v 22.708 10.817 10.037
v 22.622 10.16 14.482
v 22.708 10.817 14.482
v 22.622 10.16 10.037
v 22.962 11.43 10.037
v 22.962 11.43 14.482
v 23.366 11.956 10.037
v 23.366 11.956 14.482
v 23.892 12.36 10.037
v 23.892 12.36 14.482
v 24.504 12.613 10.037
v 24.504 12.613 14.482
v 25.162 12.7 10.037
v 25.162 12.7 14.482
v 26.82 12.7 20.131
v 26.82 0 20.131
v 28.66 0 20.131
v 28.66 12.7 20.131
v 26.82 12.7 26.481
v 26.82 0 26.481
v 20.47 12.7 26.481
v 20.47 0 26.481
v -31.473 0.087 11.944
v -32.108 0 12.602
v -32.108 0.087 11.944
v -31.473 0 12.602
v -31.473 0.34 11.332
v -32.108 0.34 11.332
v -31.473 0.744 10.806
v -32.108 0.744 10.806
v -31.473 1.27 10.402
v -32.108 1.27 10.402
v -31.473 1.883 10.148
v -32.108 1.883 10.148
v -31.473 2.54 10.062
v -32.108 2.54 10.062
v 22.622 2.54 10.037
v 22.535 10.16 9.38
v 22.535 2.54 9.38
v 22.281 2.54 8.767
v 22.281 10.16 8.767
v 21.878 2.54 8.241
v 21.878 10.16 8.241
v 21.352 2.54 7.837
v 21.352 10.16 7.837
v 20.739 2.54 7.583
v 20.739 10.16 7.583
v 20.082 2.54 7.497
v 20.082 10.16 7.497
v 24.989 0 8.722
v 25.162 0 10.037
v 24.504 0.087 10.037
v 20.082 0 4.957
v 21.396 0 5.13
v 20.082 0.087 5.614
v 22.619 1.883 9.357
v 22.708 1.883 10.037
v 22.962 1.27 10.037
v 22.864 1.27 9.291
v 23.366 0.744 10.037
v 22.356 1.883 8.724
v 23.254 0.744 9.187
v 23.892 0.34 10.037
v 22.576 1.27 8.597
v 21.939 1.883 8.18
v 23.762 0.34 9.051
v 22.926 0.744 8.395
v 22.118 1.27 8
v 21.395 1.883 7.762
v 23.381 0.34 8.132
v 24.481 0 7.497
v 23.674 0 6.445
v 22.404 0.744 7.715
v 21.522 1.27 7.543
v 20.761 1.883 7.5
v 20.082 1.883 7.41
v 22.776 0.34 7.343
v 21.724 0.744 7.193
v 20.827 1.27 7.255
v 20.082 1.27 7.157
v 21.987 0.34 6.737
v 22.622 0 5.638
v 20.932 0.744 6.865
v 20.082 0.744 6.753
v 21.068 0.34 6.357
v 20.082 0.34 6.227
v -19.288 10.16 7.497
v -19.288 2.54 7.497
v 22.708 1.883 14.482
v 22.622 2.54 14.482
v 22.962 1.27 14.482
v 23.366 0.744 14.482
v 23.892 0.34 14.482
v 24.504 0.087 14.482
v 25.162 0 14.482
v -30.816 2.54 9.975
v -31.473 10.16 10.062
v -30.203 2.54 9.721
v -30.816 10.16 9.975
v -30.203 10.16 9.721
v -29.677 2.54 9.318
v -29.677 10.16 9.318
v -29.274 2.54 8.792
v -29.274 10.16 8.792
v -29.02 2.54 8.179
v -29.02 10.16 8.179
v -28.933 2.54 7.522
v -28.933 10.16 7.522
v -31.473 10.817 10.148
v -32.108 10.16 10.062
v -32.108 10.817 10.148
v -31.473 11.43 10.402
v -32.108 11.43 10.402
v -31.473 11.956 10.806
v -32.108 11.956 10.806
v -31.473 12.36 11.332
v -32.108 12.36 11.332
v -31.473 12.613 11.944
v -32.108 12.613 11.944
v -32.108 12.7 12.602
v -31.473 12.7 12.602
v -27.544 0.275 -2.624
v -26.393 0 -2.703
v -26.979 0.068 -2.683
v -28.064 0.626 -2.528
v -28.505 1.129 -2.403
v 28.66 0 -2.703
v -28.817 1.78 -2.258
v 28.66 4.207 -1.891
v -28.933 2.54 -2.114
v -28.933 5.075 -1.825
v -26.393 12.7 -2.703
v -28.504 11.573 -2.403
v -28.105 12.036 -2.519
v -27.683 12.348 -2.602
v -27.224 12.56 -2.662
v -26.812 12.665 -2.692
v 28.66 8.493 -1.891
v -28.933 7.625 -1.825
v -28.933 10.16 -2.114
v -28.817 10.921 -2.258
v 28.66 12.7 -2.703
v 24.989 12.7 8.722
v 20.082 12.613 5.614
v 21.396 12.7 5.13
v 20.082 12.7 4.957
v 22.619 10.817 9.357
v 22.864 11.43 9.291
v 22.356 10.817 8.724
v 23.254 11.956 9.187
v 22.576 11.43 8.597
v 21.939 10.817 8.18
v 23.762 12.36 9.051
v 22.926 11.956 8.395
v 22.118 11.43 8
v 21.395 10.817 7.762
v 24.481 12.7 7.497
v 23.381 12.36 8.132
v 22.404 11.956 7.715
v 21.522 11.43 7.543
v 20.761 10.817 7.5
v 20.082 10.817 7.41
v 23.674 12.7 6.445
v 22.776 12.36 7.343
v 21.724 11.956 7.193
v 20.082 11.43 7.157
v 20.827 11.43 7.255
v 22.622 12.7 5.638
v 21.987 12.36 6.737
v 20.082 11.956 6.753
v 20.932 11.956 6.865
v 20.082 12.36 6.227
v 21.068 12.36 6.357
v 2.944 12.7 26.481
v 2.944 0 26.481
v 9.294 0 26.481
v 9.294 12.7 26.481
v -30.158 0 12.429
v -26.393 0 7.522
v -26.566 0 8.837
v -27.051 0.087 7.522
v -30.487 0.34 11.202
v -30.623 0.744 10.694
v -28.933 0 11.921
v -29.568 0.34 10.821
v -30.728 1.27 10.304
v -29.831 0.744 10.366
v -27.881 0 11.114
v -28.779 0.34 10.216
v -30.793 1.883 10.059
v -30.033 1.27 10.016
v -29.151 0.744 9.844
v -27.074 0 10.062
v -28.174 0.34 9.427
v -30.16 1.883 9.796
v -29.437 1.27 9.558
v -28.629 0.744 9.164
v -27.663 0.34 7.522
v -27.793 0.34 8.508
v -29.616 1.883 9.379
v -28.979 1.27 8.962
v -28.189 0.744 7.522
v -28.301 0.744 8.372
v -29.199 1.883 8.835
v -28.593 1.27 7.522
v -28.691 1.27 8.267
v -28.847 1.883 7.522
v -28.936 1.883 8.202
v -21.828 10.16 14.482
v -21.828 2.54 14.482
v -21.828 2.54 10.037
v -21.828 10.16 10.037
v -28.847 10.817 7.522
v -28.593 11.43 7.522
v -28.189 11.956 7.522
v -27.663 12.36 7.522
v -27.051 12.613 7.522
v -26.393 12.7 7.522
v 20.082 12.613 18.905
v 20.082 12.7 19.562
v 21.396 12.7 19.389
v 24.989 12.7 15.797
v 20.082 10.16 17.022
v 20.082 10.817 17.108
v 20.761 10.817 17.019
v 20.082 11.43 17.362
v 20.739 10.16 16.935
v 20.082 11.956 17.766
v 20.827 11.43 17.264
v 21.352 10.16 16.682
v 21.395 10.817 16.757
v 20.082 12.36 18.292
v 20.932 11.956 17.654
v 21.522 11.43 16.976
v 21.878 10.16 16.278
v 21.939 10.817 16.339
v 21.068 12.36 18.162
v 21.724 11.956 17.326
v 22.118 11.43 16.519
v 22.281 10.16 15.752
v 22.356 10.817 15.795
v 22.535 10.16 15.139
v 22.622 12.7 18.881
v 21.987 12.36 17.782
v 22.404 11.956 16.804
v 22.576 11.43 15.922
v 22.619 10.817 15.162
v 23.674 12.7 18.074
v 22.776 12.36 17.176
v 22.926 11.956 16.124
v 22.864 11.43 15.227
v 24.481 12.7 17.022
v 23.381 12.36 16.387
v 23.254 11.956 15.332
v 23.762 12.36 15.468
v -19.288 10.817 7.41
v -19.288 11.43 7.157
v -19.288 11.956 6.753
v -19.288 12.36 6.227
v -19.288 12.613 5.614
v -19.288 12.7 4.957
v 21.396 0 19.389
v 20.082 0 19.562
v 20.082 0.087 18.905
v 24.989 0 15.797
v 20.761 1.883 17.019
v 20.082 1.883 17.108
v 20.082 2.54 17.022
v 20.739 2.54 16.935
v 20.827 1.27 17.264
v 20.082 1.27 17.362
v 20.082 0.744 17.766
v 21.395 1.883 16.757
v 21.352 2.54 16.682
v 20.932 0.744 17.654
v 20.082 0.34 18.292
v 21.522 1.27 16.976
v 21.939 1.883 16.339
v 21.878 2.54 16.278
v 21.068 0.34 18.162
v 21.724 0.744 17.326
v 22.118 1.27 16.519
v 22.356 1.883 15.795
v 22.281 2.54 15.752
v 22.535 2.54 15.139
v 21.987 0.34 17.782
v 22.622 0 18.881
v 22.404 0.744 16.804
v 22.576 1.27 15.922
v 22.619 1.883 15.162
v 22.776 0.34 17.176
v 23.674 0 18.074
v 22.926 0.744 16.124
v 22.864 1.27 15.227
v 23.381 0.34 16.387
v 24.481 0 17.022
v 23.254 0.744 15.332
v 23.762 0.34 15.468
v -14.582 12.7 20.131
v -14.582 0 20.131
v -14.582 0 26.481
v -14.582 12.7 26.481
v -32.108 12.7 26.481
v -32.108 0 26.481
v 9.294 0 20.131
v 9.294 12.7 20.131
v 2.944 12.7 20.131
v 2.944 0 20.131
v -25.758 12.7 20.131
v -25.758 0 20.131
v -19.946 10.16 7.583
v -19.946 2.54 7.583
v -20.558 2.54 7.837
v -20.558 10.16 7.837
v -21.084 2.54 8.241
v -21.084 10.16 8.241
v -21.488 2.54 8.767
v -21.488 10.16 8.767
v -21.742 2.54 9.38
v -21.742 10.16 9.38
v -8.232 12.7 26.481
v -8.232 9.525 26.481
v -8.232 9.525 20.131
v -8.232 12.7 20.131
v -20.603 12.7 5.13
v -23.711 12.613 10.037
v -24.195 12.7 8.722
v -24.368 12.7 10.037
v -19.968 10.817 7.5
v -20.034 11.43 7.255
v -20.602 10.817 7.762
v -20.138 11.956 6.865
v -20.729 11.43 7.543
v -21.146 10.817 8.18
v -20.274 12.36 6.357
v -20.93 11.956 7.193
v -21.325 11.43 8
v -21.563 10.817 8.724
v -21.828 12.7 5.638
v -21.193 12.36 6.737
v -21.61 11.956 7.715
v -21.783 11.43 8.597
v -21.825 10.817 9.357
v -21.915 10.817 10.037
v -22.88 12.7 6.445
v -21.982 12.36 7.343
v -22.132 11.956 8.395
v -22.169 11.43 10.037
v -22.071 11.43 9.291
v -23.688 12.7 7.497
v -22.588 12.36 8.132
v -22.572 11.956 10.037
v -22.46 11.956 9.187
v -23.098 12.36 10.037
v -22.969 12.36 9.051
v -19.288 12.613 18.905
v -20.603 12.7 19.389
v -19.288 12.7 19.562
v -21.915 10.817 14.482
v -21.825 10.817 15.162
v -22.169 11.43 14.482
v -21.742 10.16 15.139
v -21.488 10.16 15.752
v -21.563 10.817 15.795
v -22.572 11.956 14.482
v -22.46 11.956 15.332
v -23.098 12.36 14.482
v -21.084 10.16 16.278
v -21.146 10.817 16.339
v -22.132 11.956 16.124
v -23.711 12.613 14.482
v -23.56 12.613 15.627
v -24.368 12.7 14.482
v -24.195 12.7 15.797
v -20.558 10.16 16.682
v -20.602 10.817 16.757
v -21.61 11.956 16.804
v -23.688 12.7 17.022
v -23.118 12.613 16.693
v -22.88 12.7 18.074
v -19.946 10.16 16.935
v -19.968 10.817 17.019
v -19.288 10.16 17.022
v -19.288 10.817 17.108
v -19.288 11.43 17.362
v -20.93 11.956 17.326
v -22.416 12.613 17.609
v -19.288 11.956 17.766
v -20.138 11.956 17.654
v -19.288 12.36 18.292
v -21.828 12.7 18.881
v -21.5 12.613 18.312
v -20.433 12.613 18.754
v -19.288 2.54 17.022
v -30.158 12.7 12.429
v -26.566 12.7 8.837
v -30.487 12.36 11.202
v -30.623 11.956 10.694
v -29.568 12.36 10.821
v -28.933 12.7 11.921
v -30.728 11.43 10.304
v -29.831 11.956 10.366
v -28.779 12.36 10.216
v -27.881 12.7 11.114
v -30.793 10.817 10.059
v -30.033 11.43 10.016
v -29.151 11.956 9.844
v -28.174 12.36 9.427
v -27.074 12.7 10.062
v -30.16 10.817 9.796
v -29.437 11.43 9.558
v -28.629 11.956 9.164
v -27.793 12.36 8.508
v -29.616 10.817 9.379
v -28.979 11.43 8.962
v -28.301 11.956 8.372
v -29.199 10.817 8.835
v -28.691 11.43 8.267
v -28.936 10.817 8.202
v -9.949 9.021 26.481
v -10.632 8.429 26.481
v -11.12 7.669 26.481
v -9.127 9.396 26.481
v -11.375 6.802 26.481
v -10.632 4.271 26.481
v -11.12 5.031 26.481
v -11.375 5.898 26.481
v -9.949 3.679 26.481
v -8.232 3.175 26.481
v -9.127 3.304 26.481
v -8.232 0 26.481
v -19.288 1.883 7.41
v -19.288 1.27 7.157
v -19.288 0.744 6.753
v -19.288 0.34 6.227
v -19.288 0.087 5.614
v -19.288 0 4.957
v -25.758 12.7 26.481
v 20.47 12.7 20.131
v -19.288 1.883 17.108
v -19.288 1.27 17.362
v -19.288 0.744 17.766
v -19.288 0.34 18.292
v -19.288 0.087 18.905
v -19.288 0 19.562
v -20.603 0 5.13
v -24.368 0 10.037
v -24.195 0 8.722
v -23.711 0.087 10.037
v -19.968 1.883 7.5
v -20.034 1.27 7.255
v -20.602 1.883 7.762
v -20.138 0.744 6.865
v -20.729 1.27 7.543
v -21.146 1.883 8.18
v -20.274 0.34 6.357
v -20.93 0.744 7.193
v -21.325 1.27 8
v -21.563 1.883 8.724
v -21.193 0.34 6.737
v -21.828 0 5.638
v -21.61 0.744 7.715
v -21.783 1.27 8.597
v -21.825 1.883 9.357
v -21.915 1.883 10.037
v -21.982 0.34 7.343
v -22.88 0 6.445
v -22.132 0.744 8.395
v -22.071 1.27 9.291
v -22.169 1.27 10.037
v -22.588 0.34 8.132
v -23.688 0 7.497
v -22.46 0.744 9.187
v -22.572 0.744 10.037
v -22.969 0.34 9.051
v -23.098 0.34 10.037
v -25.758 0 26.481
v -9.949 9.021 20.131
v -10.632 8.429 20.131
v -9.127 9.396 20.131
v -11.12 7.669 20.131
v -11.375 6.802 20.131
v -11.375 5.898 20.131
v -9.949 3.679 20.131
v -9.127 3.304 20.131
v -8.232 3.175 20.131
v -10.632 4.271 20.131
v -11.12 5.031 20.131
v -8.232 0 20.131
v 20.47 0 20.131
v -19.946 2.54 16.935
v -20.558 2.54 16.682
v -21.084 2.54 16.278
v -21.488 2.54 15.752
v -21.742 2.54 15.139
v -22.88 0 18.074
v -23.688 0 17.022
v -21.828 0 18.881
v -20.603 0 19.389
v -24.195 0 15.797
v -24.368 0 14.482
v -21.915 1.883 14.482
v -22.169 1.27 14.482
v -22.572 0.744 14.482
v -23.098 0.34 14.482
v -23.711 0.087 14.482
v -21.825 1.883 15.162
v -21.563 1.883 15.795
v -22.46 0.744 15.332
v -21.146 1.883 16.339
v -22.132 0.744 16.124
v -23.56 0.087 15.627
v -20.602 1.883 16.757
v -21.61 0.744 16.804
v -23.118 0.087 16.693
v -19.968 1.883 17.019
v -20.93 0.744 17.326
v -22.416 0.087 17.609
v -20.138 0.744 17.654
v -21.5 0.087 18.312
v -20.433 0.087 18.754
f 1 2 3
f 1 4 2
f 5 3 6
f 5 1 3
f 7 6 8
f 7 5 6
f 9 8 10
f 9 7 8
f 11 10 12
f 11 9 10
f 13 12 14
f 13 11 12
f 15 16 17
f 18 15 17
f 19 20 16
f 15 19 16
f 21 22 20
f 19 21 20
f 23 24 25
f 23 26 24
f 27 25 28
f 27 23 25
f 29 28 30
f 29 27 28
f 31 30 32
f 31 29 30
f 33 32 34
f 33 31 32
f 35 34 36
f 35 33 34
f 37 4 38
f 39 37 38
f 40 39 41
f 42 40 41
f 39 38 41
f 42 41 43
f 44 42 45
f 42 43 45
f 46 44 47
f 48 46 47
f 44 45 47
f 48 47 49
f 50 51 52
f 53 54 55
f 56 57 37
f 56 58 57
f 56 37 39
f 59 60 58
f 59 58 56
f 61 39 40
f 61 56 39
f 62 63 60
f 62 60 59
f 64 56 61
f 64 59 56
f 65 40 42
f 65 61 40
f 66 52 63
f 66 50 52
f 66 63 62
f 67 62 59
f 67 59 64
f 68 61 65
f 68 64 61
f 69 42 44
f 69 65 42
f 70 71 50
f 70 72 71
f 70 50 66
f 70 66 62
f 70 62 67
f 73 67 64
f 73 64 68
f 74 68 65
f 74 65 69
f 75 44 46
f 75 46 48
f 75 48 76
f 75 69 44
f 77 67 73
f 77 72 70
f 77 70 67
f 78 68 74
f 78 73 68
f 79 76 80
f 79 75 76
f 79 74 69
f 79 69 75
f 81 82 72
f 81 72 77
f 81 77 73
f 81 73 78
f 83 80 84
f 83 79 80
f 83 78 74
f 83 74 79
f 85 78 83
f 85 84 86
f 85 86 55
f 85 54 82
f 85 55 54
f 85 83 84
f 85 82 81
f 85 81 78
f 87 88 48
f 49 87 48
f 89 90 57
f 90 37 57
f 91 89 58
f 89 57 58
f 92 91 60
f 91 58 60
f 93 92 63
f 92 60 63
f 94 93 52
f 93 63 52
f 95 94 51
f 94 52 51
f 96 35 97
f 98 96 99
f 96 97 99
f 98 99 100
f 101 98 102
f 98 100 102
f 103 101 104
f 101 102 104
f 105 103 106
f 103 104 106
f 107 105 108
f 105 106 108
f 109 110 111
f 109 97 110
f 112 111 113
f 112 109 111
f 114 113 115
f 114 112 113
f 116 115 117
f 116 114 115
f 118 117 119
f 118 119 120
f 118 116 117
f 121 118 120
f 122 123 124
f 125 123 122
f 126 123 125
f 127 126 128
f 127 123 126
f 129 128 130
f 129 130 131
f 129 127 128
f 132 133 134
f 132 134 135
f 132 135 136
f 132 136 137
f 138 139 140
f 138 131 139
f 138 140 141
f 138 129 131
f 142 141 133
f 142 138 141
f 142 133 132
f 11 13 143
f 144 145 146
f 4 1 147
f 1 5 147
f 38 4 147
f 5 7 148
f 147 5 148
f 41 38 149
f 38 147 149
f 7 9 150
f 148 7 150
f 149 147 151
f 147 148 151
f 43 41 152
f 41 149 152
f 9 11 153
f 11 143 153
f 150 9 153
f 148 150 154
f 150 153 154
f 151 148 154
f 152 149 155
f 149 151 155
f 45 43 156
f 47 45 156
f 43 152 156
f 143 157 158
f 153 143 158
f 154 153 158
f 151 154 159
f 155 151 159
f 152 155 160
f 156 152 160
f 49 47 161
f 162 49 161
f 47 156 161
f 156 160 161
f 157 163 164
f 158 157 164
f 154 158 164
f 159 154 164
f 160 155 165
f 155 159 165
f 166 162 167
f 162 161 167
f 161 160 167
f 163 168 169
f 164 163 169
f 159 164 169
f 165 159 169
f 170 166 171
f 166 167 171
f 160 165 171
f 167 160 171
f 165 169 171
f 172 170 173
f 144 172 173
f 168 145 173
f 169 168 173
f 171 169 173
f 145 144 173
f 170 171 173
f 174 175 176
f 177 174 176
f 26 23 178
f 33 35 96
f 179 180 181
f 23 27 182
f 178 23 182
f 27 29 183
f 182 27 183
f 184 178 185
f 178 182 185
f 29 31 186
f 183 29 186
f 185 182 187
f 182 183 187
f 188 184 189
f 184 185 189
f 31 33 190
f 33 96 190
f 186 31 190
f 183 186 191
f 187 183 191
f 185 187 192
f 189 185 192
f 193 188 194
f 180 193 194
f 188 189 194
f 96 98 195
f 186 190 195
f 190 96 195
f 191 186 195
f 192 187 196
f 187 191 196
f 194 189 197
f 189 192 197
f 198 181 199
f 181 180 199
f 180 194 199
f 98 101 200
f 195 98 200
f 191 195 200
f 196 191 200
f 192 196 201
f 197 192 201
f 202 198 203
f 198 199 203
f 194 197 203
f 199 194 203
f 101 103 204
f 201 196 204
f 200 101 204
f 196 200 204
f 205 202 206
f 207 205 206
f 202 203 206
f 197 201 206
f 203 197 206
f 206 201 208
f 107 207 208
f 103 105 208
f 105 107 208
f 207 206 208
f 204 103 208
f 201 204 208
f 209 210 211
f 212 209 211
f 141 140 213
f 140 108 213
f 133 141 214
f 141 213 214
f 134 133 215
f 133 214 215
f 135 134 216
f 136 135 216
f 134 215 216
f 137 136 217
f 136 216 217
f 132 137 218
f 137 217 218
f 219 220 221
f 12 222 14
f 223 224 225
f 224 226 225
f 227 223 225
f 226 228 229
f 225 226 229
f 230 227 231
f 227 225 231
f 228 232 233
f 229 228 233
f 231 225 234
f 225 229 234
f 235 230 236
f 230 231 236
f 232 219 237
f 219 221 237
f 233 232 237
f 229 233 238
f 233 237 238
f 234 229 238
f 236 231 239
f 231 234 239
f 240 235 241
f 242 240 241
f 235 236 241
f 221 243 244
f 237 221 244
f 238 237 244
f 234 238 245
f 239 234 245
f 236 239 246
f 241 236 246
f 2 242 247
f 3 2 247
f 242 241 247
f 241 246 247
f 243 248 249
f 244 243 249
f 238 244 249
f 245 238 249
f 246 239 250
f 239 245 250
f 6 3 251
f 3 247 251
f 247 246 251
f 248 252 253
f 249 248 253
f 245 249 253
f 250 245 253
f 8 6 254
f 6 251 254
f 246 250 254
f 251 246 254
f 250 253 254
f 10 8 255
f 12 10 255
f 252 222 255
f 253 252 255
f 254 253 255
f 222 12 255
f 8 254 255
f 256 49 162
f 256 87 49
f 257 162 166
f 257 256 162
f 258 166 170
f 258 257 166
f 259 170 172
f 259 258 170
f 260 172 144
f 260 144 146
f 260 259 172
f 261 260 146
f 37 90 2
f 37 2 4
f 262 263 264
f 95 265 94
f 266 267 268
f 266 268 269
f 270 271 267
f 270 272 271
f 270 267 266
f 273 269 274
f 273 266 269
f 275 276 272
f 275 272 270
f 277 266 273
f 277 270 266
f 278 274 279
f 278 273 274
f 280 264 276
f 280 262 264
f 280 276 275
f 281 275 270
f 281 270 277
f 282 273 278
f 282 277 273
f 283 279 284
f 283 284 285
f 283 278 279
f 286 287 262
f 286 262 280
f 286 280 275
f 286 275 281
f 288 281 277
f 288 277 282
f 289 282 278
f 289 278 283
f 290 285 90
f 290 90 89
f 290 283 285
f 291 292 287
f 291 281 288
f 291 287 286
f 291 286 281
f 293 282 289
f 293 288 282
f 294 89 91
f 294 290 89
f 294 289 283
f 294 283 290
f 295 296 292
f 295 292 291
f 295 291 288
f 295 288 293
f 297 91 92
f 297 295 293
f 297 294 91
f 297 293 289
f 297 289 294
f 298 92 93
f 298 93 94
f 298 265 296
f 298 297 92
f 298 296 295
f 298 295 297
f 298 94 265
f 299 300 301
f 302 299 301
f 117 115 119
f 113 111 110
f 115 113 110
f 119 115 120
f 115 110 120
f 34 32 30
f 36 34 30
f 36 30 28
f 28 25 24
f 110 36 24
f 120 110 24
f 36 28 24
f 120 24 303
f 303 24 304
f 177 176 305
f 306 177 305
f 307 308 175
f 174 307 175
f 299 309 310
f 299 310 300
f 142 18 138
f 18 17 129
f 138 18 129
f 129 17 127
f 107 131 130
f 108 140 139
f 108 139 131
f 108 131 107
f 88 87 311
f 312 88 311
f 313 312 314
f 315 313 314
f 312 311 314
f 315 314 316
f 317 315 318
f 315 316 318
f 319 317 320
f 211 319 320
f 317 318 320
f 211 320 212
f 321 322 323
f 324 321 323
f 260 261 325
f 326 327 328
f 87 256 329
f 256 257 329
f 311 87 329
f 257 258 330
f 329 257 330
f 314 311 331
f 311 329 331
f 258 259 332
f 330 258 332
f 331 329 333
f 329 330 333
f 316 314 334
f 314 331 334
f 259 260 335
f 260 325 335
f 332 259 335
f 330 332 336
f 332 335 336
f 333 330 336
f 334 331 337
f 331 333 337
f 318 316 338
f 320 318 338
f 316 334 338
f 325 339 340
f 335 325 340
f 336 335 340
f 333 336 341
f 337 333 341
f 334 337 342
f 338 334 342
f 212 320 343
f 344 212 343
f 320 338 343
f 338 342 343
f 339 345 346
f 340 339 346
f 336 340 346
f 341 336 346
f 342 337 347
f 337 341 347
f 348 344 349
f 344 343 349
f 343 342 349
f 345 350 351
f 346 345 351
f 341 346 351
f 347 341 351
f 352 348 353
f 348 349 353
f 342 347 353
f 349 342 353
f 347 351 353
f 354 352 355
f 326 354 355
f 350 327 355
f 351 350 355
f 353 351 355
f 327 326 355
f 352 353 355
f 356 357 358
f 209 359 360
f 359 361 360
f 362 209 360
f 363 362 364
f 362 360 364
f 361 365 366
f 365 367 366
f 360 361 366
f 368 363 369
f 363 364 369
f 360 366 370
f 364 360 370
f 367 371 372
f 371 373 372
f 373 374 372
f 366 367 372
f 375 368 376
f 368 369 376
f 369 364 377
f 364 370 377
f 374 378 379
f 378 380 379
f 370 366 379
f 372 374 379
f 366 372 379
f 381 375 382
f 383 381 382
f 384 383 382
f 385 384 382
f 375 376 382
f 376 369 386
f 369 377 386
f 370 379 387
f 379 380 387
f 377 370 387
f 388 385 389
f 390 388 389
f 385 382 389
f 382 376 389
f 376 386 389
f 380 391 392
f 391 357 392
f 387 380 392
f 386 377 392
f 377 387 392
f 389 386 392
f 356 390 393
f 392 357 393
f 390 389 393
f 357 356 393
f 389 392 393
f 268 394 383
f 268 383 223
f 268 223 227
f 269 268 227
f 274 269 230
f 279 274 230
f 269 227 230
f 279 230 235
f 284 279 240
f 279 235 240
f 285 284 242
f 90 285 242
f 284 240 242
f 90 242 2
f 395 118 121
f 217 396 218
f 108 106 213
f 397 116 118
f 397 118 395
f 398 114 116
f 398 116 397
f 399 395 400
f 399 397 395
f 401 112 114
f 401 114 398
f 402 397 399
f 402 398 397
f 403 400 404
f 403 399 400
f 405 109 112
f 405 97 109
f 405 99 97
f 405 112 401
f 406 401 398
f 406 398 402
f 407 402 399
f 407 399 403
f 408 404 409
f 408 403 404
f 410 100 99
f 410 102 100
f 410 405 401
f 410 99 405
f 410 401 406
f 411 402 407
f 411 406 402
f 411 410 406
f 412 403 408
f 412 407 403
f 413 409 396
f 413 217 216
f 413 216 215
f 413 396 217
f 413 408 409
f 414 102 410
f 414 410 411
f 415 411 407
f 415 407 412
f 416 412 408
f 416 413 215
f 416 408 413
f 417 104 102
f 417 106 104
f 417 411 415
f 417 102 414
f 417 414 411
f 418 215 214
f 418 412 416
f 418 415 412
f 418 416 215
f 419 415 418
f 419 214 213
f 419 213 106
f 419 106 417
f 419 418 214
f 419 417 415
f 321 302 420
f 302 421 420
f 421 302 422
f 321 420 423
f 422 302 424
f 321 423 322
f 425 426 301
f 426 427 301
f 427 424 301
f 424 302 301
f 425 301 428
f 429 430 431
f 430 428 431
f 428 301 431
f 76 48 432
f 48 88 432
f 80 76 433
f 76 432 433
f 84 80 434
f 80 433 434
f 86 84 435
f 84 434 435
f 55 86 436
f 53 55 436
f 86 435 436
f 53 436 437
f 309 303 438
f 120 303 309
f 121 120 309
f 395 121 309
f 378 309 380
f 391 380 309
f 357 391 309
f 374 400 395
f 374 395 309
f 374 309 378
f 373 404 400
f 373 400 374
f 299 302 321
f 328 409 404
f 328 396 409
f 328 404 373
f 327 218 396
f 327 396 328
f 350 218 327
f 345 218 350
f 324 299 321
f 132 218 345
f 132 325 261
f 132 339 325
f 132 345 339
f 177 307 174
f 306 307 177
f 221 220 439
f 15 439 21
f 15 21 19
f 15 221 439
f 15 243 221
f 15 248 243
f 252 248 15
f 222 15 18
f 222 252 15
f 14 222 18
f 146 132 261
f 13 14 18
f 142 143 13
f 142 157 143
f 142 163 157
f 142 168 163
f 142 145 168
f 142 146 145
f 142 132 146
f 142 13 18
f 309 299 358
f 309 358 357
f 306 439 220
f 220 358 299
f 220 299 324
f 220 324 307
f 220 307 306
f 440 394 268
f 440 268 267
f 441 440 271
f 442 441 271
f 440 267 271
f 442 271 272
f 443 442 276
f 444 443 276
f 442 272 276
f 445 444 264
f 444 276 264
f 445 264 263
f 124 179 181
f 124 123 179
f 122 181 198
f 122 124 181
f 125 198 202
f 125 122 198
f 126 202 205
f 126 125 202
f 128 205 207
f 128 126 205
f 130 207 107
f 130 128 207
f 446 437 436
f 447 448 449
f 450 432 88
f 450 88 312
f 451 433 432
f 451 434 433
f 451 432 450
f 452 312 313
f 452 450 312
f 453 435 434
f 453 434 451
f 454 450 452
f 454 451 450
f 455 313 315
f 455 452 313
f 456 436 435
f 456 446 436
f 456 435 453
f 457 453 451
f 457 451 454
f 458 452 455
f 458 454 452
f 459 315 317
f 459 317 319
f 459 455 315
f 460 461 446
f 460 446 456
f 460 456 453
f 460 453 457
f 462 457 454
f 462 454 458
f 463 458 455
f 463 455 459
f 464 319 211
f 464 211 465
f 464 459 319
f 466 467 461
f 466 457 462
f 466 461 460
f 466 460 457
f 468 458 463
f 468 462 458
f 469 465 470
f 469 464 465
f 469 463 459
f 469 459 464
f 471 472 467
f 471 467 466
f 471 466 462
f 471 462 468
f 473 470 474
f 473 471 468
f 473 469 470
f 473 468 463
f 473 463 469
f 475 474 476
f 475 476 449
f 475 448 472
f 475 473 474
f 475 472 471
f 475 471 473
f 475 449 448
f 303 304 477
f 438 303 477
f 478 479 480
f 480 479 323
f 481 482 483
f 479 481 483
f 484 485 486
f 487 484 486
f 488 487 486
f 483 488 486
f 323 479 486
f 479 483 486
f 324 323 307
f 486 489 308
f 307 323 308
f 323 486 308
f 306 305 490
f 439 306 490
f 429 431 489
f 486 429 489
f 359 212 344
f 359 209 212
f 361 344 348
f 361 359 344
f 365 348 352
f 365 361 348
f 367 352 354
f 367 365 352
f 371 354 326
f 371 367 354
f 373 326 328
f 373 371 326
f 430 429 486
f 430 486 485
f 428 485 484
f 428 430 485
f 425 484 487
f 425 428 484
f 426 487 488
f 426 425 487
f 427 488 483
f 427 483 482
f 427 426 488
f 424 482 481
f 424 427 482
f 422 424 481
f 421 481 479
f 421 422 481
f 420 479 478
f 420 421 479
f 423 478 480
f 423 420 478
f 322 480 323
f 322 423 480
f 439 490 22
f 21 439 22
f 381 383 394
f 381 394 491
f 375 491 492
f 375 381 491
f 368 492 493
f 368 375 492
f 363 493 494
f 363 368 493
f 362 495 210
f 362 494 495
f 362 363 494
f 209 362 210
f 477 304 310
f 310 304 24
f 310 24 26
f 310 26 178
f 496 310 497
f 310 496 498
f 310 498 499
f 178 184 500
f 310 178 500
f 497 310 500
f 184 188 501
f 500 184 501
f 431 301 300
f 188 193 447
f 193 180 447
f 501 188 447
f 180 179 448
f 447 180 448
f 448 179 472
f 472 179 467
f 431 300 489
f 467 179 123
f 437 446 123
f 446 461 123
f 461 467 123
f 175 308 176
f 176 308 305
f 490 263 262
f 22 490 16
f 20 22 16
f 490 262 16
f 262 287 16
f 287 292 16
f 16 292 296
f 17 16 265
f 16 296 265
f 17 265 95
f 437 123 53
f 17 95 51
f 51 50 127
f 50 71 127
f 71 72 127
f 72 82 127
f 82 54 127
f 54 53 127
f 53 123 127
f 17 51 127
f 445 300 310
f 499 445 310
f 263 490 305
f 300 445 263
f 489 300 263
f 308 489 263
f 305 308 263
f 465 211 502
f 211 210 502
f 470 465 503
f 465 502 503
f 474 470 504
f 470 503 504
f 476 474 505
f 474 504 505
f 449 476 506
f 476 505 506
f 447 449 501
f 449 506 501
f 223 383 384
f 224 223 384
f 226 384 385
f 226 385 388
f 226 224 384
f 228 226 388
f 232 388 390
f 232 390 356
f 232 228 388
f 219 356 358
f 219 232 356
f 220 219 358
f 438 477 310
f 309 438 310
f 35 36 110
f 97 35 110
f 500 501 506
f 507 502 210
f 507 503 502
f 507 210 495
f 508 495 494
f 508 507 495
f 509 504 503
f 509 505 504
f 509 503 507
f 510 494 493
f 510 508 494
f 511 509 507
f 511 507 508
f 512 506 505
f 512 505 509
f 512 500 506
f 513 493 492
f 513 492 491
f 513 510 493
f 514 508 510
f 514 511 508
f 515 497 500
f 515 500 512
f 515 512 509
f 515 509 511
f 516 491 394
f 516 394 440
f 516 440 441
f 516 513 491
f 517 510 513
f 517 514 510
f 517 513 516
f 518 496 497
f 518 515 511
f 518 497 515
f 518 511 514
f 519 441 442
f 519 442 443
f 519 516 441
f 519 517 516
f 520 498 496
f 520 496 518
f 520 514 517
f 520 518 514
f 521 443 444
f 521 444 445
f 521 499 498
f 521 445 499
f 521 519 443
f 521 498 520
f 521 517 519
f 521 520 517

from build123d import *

# Parameters (mm, degrees)
SKETCH1_W           = 44.45
SKETCH1_H           = 9.525
BOSS_EXTRUDE1_DEPTH = 12.7
FILLET1_R           = 2.54
FILLET2_R           = 2.54
CUT_EXTRUDE2_DEPTH  = 6.35
CUT_EXTRUDE6_DEPTH  = 68.493049433
CUT_EXTRUDE7_DEPTH  = 3.175
SKETCH5_W           = 9.525
SKETCH5_H           = 12.7
CUT_EXTRUDE8_DEPTH  = 3.175
FILLET3_R           = 2.54


with BuildPart() as part:
    # Sketch1 → Boss-Extrude1 (new body)
    with BuildSketch(Plane(origin=(0, 0, 0), x_dir=(1, 0, 0), z_dir=(0, 1, 0))):
        Polygon((26.819703528, -20.131014632), (28.659931952, -20.131014632), (28.659931952, 17.968985368), (-28.898317878, 17.968985368), (-28.898317878, 12.851244956), (-32.108296472, 12.851244956), (-32.108296472, -20.131014632), (-32.108296472, -26.481014632), (-25.758296472, -26.481014632), (-25.758296472, -20.131014632), (-14.582296472, -20.131014632), (-14.582296472, -26.481014632), (-8.232296472, -26.481014632), (-8.232296472, -20.131014632), (2.943703528, -20.131014632), (2.943703528, -26.481014632), (9.293703528, -26.481014632), (9.293703528, -20.131014632), (20.469703528, -20.131014632), (20.469703528, -26.481014632), (26.819703528, -26.481014632), align=None)
        with Locations((0.396638353, -12.259443339)):
            Rectangle(SKETCH1_W, SKETCH1_H, mode=Mode.SUBTRACT)
    extrude(amount=BOSS_EXTRUDE1_DEPTH)

    # Fillet1
    fillet1_edges = [part.edges().sort_by_distance(p)[0] for p in [
        (22.621638353, 6.35, 17.021943339),
        (22.621638353, 6.35, 7.496943339),
        (-21.828361647, 6.35, 7.496943339),
        (-21.828361647, 6.35, 17.021943339),
    ]]
    fillet(fillet1_edges, radius=FILLET1_R)

    # Fillet2
    fillet2_edges = [part.edges().sort_by_distance(p)[0] for p in [
        (0.396638353, 0, 17.021943339),
        (0.396638353, 12.7, 17.021943339),
        (22.621638353, 0, 12.259443339),
        (22.621638353, 12.7, 12.259443339),
        (0.396638353, 0, 7.496943339),
        (0.396638353, 12.7, 7.496943339),
        (-21.828361647, 0, 12.259443339),
        (-21.828361647, 12.7, 12.259443339),
        (21.877689577, 0, 16.277994563),
        (21.877689577, 12.7, 16.277994563),
        (21.877689577, 0, 8.240892115),
        (21.877689577, 12.7, 8.240892115),
        (-21.084412871, 0, 8.240892115),
        (-21.084412871, 12.7, 8.240892115),
        (-21.084412871, 0, 16.277994563),
        (-21.084412871, 12.7, 16.277994563),
    ]]
    fillet(fillet2_edges, radius=FILLET2_R)

    # Sketch3 → Cut-Extrude2 (cut)
    with BuildSketch(Plane.XY.offset(26.481014632)):
        with BuildLine():
            Line((-8.232296472, 9.525), (-8.232296472, 3.175))
            ThreePointArc((-8.232296472, 3.175), (-11.407296472, 6.35), (-8.232296472, 9.525))
        make_face()
    extrude(amount=-CUT_EXTRUDE2_DEPTH, mode=Mode.SUBTRACT)

    # Sketch2 → Cut-Extrude6 (cut, through all)
    with BuildSketch(Plane(origin=(28.659931952, 0, 0), x_dir=(0, 0, -1), z_dir=(1, 0, 0))):
        with BuildLine():
            Line((2.702570586, 12.7), (17.968985368, 12.7))
            Line((17.968985368, 12.7), (17.968985368, 0))
            Line((17.968985368, 0), (2.702570586, 0))
            ThreePointArc((2.702570586, 0), (1.789185368, 6.35), (2.702570586, 12.7))
        make_face()
    extrude(amount=-CUT_EXTRUDE6_DEPTH, mode=Mode.SUBTRACT)

    # Sketch4 → Cut-Extrude7 (cut)
    with BuildSketch(Plane.ZY.offset(32.108296472)):
        with BuildLine():
            Line((0.536702432, 0), (-10.240735591, 0))
            Line((-10.240735591, 0), (-10.240735591, 12.7))
            Line((-10.240735591, 12.7), (0.536702432, 12.7))
            ThreePointArc((0.536702432, 12.7), (1.335014632, 6.35), (0.536702432, 0))
        make_face()
    extrude(amount=-CUT_EXTRUDE7_DEPTH, mode=Mode.SUBTRACT)

    # Sketch5 → Cut-Extrude8 (cut)
    with BuildSketch(Plane.ZY.offset(32.108296472)):
        with Locations((5.299202432, 6.35)):
            Rectangle(SKETCH5_W, SKETCH5_H)
    extrude(amount=-CUT_EXTRUDE8_DEPTH, mode=Mode.SUBTRACT)

    # Fillet3
    fillet3_edges = [part.edges().sort_by_distance(p)[0] for p in [
        (-28.933296472, 0, 3.679565923),
        (-28.933296472, 12.7, 3.679565923),
        (-28.933296472, 6.35, 10.061702432),
        (-30.520796472, 12.7, 10.061702432),
        (-30.520796472, 0, 10.061702432),
    ]]
    fillet(fillet3_edges, radius=FILLET3_R)


solid = part.part
